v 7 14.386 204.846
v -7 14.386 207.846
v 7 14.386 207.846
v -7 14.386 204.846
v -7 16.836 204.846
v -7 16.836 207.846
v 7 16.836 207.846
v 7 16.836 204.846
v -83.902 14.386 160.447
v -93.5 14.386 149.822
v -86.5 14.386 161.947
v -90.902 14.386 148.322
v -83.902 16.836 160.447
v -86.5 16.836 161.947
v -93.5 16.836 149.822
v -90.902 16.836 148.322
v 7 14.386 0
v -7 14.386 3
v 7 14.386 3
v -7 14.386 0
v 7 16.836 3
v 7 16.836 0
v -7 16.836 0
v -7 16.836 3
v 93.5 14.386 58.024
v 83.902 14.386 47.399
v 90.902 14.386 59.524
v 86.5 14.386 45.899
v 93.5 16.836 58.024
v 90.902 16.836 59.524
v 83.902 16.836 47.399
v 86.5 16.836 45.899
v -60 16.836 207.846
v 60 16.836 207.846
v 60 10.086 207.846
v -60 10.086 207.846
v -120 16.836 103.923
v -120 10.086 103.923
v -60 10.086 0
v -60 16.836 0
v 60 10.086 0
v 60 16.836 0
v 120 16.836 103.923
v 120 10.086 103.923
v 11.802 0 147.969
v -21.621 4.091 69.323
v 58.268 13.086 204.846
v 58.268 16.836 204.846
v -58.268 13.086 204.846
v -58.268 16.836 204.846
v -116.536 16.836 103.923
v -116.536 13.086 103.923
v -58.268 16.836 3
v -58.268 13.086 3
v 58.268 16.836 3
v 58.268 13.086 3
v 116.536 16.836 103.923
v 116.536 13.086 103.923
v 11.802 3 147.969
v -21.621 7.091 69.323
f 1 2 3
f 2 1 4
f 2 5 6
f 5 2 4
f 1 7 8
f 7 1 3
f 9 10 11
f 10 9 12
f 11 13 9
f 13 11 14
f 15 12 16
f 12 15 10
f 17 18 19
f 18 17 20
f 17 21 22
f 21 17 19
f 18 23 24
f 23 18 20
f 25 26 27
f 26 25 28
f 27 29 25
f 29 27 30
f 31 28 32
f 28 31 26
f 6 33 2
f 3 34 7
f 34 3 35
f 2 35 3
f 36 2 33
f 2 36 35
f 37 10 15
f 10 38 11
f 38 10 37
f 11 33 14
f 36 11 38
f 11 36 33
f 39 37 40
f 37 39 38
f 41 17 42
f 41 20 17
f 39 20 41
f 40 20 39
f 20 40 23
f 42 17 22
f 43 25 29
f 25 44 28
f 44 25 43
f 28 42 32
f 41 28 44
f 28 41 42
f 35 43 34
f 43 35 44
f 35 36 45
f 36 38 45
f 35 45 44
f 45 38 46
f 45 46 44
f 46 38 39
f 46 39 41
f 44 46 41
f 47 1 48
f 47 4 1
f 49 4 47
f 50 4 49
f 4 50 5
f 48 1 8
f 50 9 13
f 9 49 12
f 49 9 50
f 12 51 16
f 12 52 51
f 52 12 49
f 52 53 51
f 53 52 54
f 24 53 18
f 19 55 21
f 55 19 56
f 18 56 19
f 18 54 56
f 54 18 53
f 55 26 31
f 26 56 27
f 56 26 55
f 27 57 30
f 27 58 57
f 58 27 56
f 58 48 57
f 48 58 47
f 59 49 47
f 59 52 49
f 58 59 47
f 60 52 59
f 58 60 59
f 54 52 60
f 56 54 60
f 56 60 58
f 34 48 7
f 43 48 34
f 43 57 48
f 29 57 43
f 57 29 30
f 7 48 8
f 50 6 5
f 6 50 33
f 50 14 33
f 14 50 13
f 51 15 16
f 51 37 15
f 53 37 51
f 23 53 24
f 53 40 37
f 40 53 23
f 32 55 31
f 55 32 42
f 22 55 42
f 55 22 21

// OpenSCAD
/*
    parametric_faceted_hex_wall_tile_mount_v39_removable_adhesive_clips.scad
    ------------------------------------------------------------
    Improved asymmetric low-poly hex wall tile.

    v39 removable adhesive-clip edition
    ------------------------------------
    Goals:
    - Preserve the clean open-back wall tile.
    - Preserve fast flat-side-down vertical printing.
    - Remove all integrated adhesive tabs/pads.
    - Add four shallow receiver pockets in the rear perimeter wall.
    - Use four identical separately printed adhesive clips.
    - Clips print flat and have a large planar surface for Command strips,
      VHB, or other double-sided wall tape.
    - Tile remains free of floating mounting islands.

    Major v22 changes
    -----------------
    1. ONE master thickness control drives the whole part:
       master_thickness_mm

    2. FIXED mounting tabs showing through the front face.
       - edge height now automatically provides enough cavity depth
         for the full mounting-pad thickness
       - mounting tabs and ribs are also clipped against a safe volume
         below the underside of the faceted front shell
       - tabs therefore remain hidden inside the tile


       It controls:
       - faceted front shell thickness
       - perimeter wall thickness
       - mounting-tab thickness

       Optional multipliers allow advanced tuning without hiding the
       master control.

    2. Thicker shells now work automatically.
       The effective edge height is automatically raised when required
       so shell_thickness_mm is never blocked by a too-small edge height.

    3. Mounting pads cannot protrude outside the hexagon.
       Pads are intersected with a smaller inset hex footprint.

    4. Stronger default mounting geometry.
       - 3.0 mm pad thickness
       - 4.0 mm shell overlap
       - 3.0 mm edge inset
       - optional reinforcing ribs

    5. Open back remains truly open.
       There is no rear floor across the middle.

    Recommended use
    ---------------
    For a 9-inch decorative wall tile printed vertically:

        master_thickness_mm        = 3.0;
        front_shell_multiplier      = 1.0;
        perimeter_multiplier        = 1.0;
        mount_pad_multiplier        = 1.0;
        mount_pad_overlap_mm        = 4.0;
        mount_pad_edge_inset_mm     = 3.0;
        add_mount_ribs              = true;

    Export
    ------
    F6 Render
    File -> Export -> Export as STL
*/


// =============================================================================
// CUSTOMIZER PARAMETERS
// =============================================================================


/* [Tile Size] */

// Which dimension tile_size represents.
size_reference = "across_corners";   // [flat_to_flat, across_corners]

// Units for tile_size.
size_units = "mm";                   // [mm, in]

// Examples:
// 152.4 = 6"
// 203.2 = 8"
// 228.6 = 9"
// 254.0 = 10"
tile_size = 240.0;

// Rotate finished tile around Z.
tile_rotation_deg = 15;


/* [Export / Print Orientation] */

// "flat"     = original CAD orientation.
// "vertical" = stand the tile on one complete flat hex side.
export_orientation = "vertical";          // [flat, vertical]

// Finished face uses 15 degrees. Adding another 15 degrees before standing
// gives an effective 30-degree regular-hex orientation, so a COMPLETE FLAT
// SIDE rests on the build plate.
vertical_edge_angle_deg = 15;


/* [v39 Part Output] */

// tile     = vertical-print-ready tile with four receiver pockets
// clip     = one removable adhesive clip, oriented flat for printing
// assembly = flat CAD preview of tile + four clips installed
part_to_render = "tile";                  // [tile, clip, assembly]


/* [Removable Adhesive Clip System] */

// Receiver locations match the original four-pad concept.
clip_angles = [60, 120, 240, 300];

// Receiver pocket width along the local perimeter.
receiver_width_mm = 14.0;

// Receiver pocket depth across the perimeter ring.
// Slightly larger than the 3 mm wall so the pocket fully opens to the cavity.
receiver_radial_depth_mm = 4.2;

// Receiver recess depth from the rear face into the tile.
receiver_recess_mm = 2.4;

// Clearance around the clip tongue.
clip_clearance_mm = 0.25;

// Adhesive pad body size.
clip_body_width_mm = 32.0;
clip_body_depth_mm = 24.0;
clip_body_thickness_mm = 2.4;

// Tongue that plugs into the rear receiver pocket.
clip_tongue_width_mm =
    receiver_width_mm - 2 * clip_clearance_mm;

clip_tongue_radial_depth_mm =
    3.2;

clip_tongue_height_mm =
    receiver_recess_mm - clip_clearance_mm;

// How far the large adhesive pad extends inward from the perimeter ring.
clip_body_inward_offset_mm = 1.0;

// Small lead-in taper on the tongue for easier insertion.
clip_tongue_leadin_mm = 0.6;

// Optional center relief in the adhesive body.
// Keep false for maximum tape area.
clip_body_center_relief = false;
clip_body_relief_diameter_mm = 10.0;




/* [MASTER THICKNESS] */

// MASTER MATERIAL THICKNESS.
//
// THIS is the main control to use if you want the whole printed part
// physically thicker / stronger.
//
// It directly drives:
//   - faceted front shell thickness
//   - perimeter wall thickness
//   - mounting pad thickness
//
// Recommended:
//   1.6 = light
//   2.0 = medium
//   2.5 = strong
//   3.0 = very strong / recommended for a robust wall tile
//   3.5 = heavy duty
//
master_thickness_mm = 3.0;

// Optional multipliers.
//
// Leave these at 1.0 unless you deliberately want one area stronger
// than the master value.
//
// Example:
// perimeter_multiplier = 1.20 makes a 3.0 mm master produce a
// 3.6 mm perimeter.
front_shell_multiplier = 1.0;
perimeter_multiplier   = 1.0;
mount_pad_multiplier   = 1.0;

// Derived thicknesses are calculated later from the master control.


/* [Front Relief] */

// proportional = scales with tile size
// absolute     = exact millimeter heights below
relief_height_mode = "proportional";    // [proportional, absolute]

// Overall relief multiplier.
relief_scale = 1.0;

// Main peak height relative to flat-to-flat size.
peak_height_ratio = 0.081;

// Ridge height relative to peak.
ridge_to_peak_ratio = 0.757;

// Requested outer edge height relative to peak.
//
// IMPORTANT:
// v21 automatically raises edge height if necessary to fit the selected
// front shell thickness. You normally do NOT need to change this anymore.
edge_to_peak_ratio = 0.097;

// Absolute values, used only in absolute mode.
peak_height_mm  = 18.5;
ridge_height_mm = 14.0;
edge_height_mm  = 1.8;

// Minimum empty clearance between the inner roof and Z=0 at the perimeter.
//
// v20 uses:
// effective_edge_height >= front_shell_thickness_mm + edge_clearance_mm
edge_clearance_mm = 0.60;


/* [Facet Layout] */

// Direction of main peak, CCW from +X.
peak_angle_deg = 45;

// Peak distance from center as a fraction of circumradius.
peak_radius_ratio = 0.38;

// Direction of secondary ridge.
ridge_angle_deg = 208;

// Ridge radial position.
ridge_radius_ratio = 0.34;


/* [Wall Mounting] */

// Enable mounting pads.
add_mount_pads = false;

// Width of each pad parallel to the corresponding hex side.
mount_pad_width_mm = 34.0;

// Radial depth of each pad.
mount_pad_depth_mm = 24.0;

// Mounting-tab thickness is now driven by master_thickness_mm.
// Use mount_pad_multiplier above only if the tabs need to be thicker
// or thinner than the rest of the tile.

// How far the pad reaches beneath the inner perimeter shell.
//
// More overlap creates a stronger pad-to-rim union.
mount_pad_overlap_mm = 4.0;

// Pull the ENTIRE usable pad footprint inward from the outside hex edge.
//
// Pads are clipped against this inset hex, so they cannot protrude outside.
mount_pad_edge_inset_mm = 2.0;

// Minimum air gap between the TOP of mounting geometry and the
// UNDERSIDE of the faceted front shell.
//
// This prevents tabs/ribs from becoming visible through the face.
// Recommended: 0.50-1.00 mm.
mount_face_clearance_mm = 0.75;

// Directions of mounting pads.
mount_pad_angles = [60, 120, 240, 300];


/* [Mount Reinforcement] */

// Add small triangular reinforcing ribs where pads meet the perimeter.
//
// Recommended ON for vertical printing.
add_mount_ribs = false;

// Rib thickness across the pad.
mount_rib_width_mm = 3.0;

// Rib height into the cavity.
mount_rib_height_mm = 5.0;

// Rib radial depth.
mount_rib_depth_mm = 8.0;


/* [Optional Screw Holes] */

add_pad_screw_holes = false;

// 3.5 ~= #6
// 4.5 ~= #8
pad_screw_hole_diameter_mm = 4.5;


/* [Advanced] */

// Polyhedron preview hint.
polyhedron_convexity = 12;

// Cylinder quality for screw holes.
screw_hole_fn = 40;


// =============================================================================
// DERIVED MATERIAL THICKNESSES
// =============================================================================
//
// These are the ACTUAL thicknesses used by the model.
//

front_shell_thickness_mm =
    master_thickness_mm * front_shell_multiplier;

perimeter_wall_thickness_mm =
    master_thickness_mm * perimeter_multiplier;

mount_pad_thickness_mm =
    master_thickness_mm * mount_pad_multiplier;


// =============================================================================
// DERIVED TILE DIMENSIONS
// =============================================================================

_tile_size_mm =
    size_units == "in"
        ? tile_size * 25.4
        : tile_size;

tile_flat_to_flat =
    size_reference == "flat_to_flat"
        ? _tile_size_mm
        : _tile_size_mm * cos(30);

tile_across_corners =
    tile_flat_to_flat / cos(30);

outer_apothem =
    tile_flat_to_flat / 2;

r_outer =
    outer_apothem / cos(30);

inner_apothem =
    outer_apothem - perimeter_wall_thickness_mm;

r_inner =
    inner_apothem / cos(30);

inner_flat_length =
    2 * inner_apothem * tan(30);

hex_side_length =
    2 * r_outer * sin(30);


// =============================================================================
// DERIVED VERTICAL-PRINT GEOMETRY
// =============================================================================

vertical_total_rotation_deg =
    tile_rotation_deg + vertical_edge_angle_deg;

vertical_half_y =
    max([
        for (i = [0 : 5])
            abs(
                r_outer
                * sin(
                    30
                    + i * 60
                    + vertical_total_rotation_deg
                )
            )
    ]);

vertical_print_height =
    2 * vertical_half_y;


// =============================================================================
// DERIVED RELIEF HEIGHTS
// =============================================================================

_peak_unscaled =
    relief_height_mode == "proportional"
        ? tile_flat_to_flat * peak_height_ratio
        : peak_height_mm;

_ridge_unscaled =
    relief_height_mode == "proportional"
        ? _peak_unscaled * ridge_to_peak_ratio
        : ridge_height_mm;

_requested_edge_unscaled =
    relief_height_mode == "proportional"
        ? _peak_unscaled * edge_to_peak_ratio
        : edge_height_mm;

peak_height =
    _peak_unscaled * relief_scale;

ridge_height =
    _ridge_unscaled * relief_scale;

requested_edge_height =
    _requested_edge_unscaled * relief_scale;

// AUTO-FIX:
// Guarantee enough vertical room for BOTH:
//   1. the chosen front-shell thickness
//   2. the full mounting-pad thickness
//
// This is the key v22 fix for tabs previously breaking through the face.
minimum_edge_height =
    front_shell_thickness_mm
    + mount_pad_thickness_mm
    + mount_face_clearance_mm;

edge_height =
    max(
        requested_edge_height,
        minimum_edge_height
    );


// =============================================================================
// DERIVED MOUNTING GEOMETRY
// =============================================================================

// Desired outer edge before clipping.
//
// This allows the pad to overlap the inner wall structurally.
mount_pad_desired_outer_r =
    inner_apothem + mount_pad_overlap_mm;

mount_pad_inner_r =
    mount_pad_desired_outer_r - mount_pad_depth_mm;

mount_pad_center_r =
    mount_pad_desired_outer_r - mount_pad_depth_mm / 2;

// Smaller hex used as a hard clipping boundary.
//
// Any mount geometry outside this boundary is removed automatically.
mount_clip_apothem =
    outer_apothem - mount_pad_edge_inset_mm;

mount_clip_radius =
    mount_clip_apothem / cos(30);


// =============================================================================
// VALIDATION
// =============================================================================

assert(
    tile_flat_to_flat > 0,
    "tile_size must produce a positive tile dimension."
);

assert(
    master_thickness_mm > 0,
    "master_thickness_mm must be greater than zero."
);

assert(
    front_shell_multiplier > 0 &&
    perimeter_multiplier > 0 &&
    mount_pad_multiplier > 0,
    "All thickness multipliers must be greater than zero."
);

assert(
    front_shell_thickness_mm > 0,
    "front_shell_thickness_mm must be greater than zero."
);

assert(
    perimeter_wall_thickness_mm > 0,
    "perimeter_wall_thickness_mm must be greater than zero."
);

assert(
    perimeter_wall_thickness_mm < outer_apothem,
    "perimeter_wall_thickness_mm is too large for this tile."
);

assert(
    inner_apothem > 0,
    "The selected perimeter wall leaves no hollow interior."
);

assert(
    edge_height > front_shell_thickness_mm,
    "Internal error: edge_height must exceed front_shell_thickness_mm."
);

assert(
    ridge_height > edge_height,
    "ridge_height must remain greater than the effective edge height."
);

assert(
    peak_height > ridge_height,
    "peak_height must remain greater than ridge_height."
);

assert(
    peak_radius_ratio > 0 && peak_radius_ratio < 0.90,
    "peak_radius_ratio must be between 0 and 0.90."
);

assert(
    ridge_radius_ratio > 0 && ridge_radius_ratio < 0.90,
    "ridge_radius_ratio must be between 0 and 0.90."
);

assert(
    mount_pad_width_mm > 0,
    "mount_pad_width_mm must be greater than zero."
);

assert(
    mount_pad_depth_mm > 0,
    "mount_pad_depth_mm must be greater than zero."
);

assert(
    mount_pad_thickness_mm > 0,
    "mount_pad_thickness_mm must be greater than zero."
);

assert(
    mount_pad_overlap_mm >= 0,
    "mount_pad_overlap_mm cannot be negative."
);

assert(
    mount_pad_edge_inset_mm >= 0,
    "mount_pad_edge_inset_mm cannot be negative."
);

assert(
    mount_face_clearance_mm >= 0,
    "mount_face_clearance_mm cannot be negative."
);

assert(
    mount_clip_apothem > 0,
    "mount_pad_edge_inset_mm is too large."
);

assert(
    mount_pad_inner_r > 0,
    "mount_pad_depth_mm is too large and reaches/passes the tile center."
);

assert(
    !add_pad_screw_holes ||
    pad_screw_hole_diameter_mm < mount_pad_width_mm * 0.75,
    "pad_screw_hole_diameter_mm is too large for the mounting pad."
);

assert(
    !add_mount_ribs ||
    mount_rib_height_mm > 0,
    "mount_rib_height_mm must be greater than zero."
);


assert(
    receiver_width_mm > 0,
    "receiver_width_mm must be greater than zero."
);

assert(
    receiver_radial_depth_mm > 0,
    "receiver_radial_depth_mm must be greater than zero."
);

assert(
    receiver_recess_mm > 0
    && receiver_recess_mm < edge_height,
    "receiver_recess_mm must be positive and smaller than edge_height."
);

assert(
    clip_clearance_mm >= 0,
    "clip_clearance_mm cannot be negative."
);

assert(
    clip_body_width_mm > clip_tongue_width_mm,
    "clip_body_width_mm must be wider than the clip tongue."
);

assert(
    clip_body_depth_mm > clip_tongue_radial_depth_mm,
    "clip_body_depth_mm must exceed the tongue radial depth."
);

assert(
    clip_tongue_height_mm > 0,
    "clip_tongue_height_mm must be greater than zero."
);


// =============================================================================
// DIAGNOSTIC OUTPUT
// =============================================================================

echo("====================================================");
echo("FACETED HEX WALL TILE v22");
echo("====================================================");

echo(str("flat-to-flat             : ", tile_flat_to_flat, " mm"));
echo(str("across-corners           : ", tile_across_corners, " mm"));
echo(str("hex side length          : ", hex_side_length, " mm"));

echo(str("MASTER thickness         : ", master_thickness_mm, " mm"));
echo(str("actual front shell       : ", front_shell_thickness_mm, " mm"));
echo(str("actual perimeter wall    : ", perimeter_wall_thickness_mm, " mm"));
echo(str("actual mount pad         : ", mount_pad_thickness_mm, " mm"));
echo(str("perimeter wall thickness : ", perimeter_wall_thickness_mm, " mm"));

echo(str("requested edge height    : ", requested_edge_height, " mm"));
echo(str("minimum edge height      : ", minimum_edge_height, " mm"));
echo(str("EFFECTIVE edge height    : ", edge_height, " mm"));

echo(str("ridge height             : ", ridge_height, " mm"));
echo(str("peak height              : ", peak_height, " mm"));
echo(str("export orientation       : ", export_orientation));
echo(str("vertical print height    : ", vertical_print_height, " mm"));
echo(str("vertical relief depth    : ", peak_height, " mm"));
echo(str("effective print rotation : ", vertical_total_rotation_deg, " deg"));
echo(str("v39 part                  : ", part_to_render));
echo(str("receiver width            : ", receiver_width_mm, " mm"));
echo(str("receiver recess           : ", receiver_recess_mm, " mm"));
echo(str("clip body                 : ", clip_body_width_mm, " x ",
         clip_body_depth_mm, " x ", clip_body_thickness_mm, " mm"));
echo(str("clip tongue               : ", clip_tongue_width_mm, " x ",
         clip_tongue_radial_depth_mm, " x ", clip_tongue_height_mm, " mm"));

echo(str("mount pad width          : ", mount_pad_width_mm, " mm"));
echo(str("mount pad depth          : ", mount_pad_depth_mm, " mm"));
echo(str("mount pad thickness      : ", mount_pad_thickness_mm, " mm"));
echo(str("mount pad overlap        : ", mount_pad_overlap_mm, " mm"));
echo(str("mount edge inset         : ", mount_pad_edge_inset_mm, " mm"));
echo(str("mount/face clearance     : ", mount_face_clearance_mm, " mm"));

echo(str("mount clip apothem       : ", mount_clip_apothem, " mm"));

if (edge_height > requested_edge_height)
    echo(
        str(
            "AUTO EDGE FIX ACTIVE: edge raised from ",
            requested_edge_height,
            " mm to ",
            edge_height,
            " mm so a ",
            front_shell_thickness_mm,
            " mm front shell and ", mount_pad_thickness_mm, " mm mounting tabs fit safely."
        )
    );

echo("====================================================");


// =============================================================================
// HELPERS
// =============================================================================

function polar(angle_deg, radius) =
    [
        radius * cos(angle_deg),
        radius * sin(angle_deg)
    ];

function hex_vertex(i, radius) =
    [
        radius * cos(30 + i * 60),
        radius * sin(30 + i * 60)
    ];


// =============================================================================
// FRONT RELIEF CONTROL POINTS
// =============================================================================

P_xy =
    polar(
        peak_angle_deg,
        r_outer * peak_radius_ratio
    );

Q_xy =
    polar(
        ridge_angle_deg,
        r_outer * ridge_radius_ratio
    );


// =============================================================================
// SHELL VERTICES
// =============================================================================

points =
    concat(

        // 0..5 : outer rear perimeter
        [
            for (i = [0 : 5])
                let(p = hex_vertex(i, r_outer))
                [p[0], p[1], 0]
        ],

        // 6..11 : outer front perimeter
        [
            for (i = [0 : 5])
                let(p = hex_vertex(i, r_outer))
                [p[0], p[1], edge_height]
        ],

        // 12..13 : outer peak / ridge
        [
            [P_xy[0], P_xy[1], peak_height],
            [Q_xy[0], Q_xy[1], ridge_height]
        ],

        // 14..19 : inner rear perimeter
        [
            for (i = [0 : 5])
                let(p = hex_vertex(i, r_inner))
                [p[0], p[1], 0]
        ],

        // 20..25 : inner front perimeter
        [
            for (i = [0 : 5])
                let(p = hex_vertex(i, r_inner))
                [p[0], p[1], edge_height - front_shell_thickness_mm]
        ],

        // 26..27 : inner peak / ridge
        [
            [P_xy[0], P_xy[1], peak_height - front_shell_thickness_mm],
            [Q_xy[0], Q_xy[1], ridge_height - front_shell_thickness_mm]
        ]
    );


// =============================================================================
// SHELL FACES
// =============================================================================

outer_roof_faces = [
    [6, 7, 12],
    [7, 8, 12],
    [6, 12, 11],

    [8, 13, 12],
    [11, 12, 13],

    [8, 9, 13],
    [9, 10, 13],
    [10, 11, 13]
];

inner_roof_faces = [
    [26, 21, 20],
    [26, 22, 21],
    [25, 26, 20],

    [26, 27, 22],
    [27, 26, 25],

    [27, 23, 22],
    [27, 24, 23],
    [27, 25, 24]
];

faces =
    concat(

        // Outer vertical perimeter
        [
            for (i = [0 : 5])
                [
                    i,
                    (i + 1) % 6,
                    6 + (i + 1) % 6,
                    6 + i
                ]
        ],

        outer_roof_faces,

        // Inner vertical perimeter
        [
            for (i = [0 : 5])
                [
                    14 + i,
                    20 + i,
                    20 + (i + 1) % 6,
                    14 + (i + 1) % 6
                ]
        ],

        inner_roof_faces,

        // Narrow rear perimeter ring only.
        // Center remains open.
        [
            for (i = [0 : 5])
                [
                    i,
                    14 + i,
                    14 + (i + 1) % 6,
                    (i + 1) % 6
                ]
        ]
    );


// =============================================================================
// TILE SHELL
// =============================================================================

module tile_shell() {
    polyhedron(
        points = points,
        faces = faces,
        convexity = polyhedron_convexity
    );
}


// =============================================================================
// SAFE MOUNTING VOLUME BELOW THE FRONT FACE
// =============================================================================
//
// This volume follows the UNDERSIDE of the faceted front shell, offset
// downward by mount_face_clearance_mm.
//
// Mount pads and ribs are intersected with this volume. Even if a future
// parameter combination becomes aggressive, mounting geometry cannot pass
// through the visible front shell.
//

safe_edge_z =
    max(
        0.01,
        edge_height
        - front_shell_thickness_mm
        - mount_face_clearance_mm
    );

safe_peak_z =
    max(
        0.01,
        peak_height
        - front_shell_thickness_mm
        - mount_face_clearance_mm
    );

safe_ridge_z =
    max(
        0.01,
        ridge_height
        - front_shell_thickness_mm
        - mount_face_clearance_mm
    );

safe_mount_points =
    concat(

        // 0..5: rear outer perimeter
        [
            for (i = [0 : 5])
                let(p = hex_vertex(i, r_outer))
                [p[0], p[1], 0]
        ],

        // 6..11: safe ceiling at outer perimeter
        [
            for (i = [0 : 5])
                let(p = hex_vertex(i, r_outer))
                [p[0], p[1], safe_edge_z]
        ],

        // 12..13: safe ceiling under peak/ridge
        [
            [P_xy[0], P_xy[1], safe_peak_z],
            [Q_xy[0], Q_xy[1], safe_ridge_z]
        ]
    );

safe_mount_ceiling_faces = [
    [6, 7, 12],
    [7, 8, 12],
    [6, 12, 11],
    [8, 13, 12],
    [11, 12, 13],
    [8, 9, 13],
    [9, 10, 13],
    [10, 11, 13]
];

safe_mount_faces =
    concat(

        // Outer side walls.
        [
            for (i = [0 : 5])
                [
                    i,
                    (i + 1) % 6,
                    6 + (i + 1) % 6,
                    6 + i
                ]
        ],

        // Sloped safe ceiling.
        safe_mount_ceiling_faces,

        // Rear floor used only as a clipping volume closure.
        [[5, 4, 3, 2, 1, 0]]
    );

module safe_mount_volume() {
    polyhedron(
        points = safe_mount_points,
        faces = safe_mount_faces,
        convexity = polyhedron_convexity
    );
}


// =============================================================================
// HEX FOOTPRINT USED TO CLIP MOUNTING TABS
// =============================================================================
//
// This is intentionally smaller than the visible outer hexagon.
// Therefore mount pads/ribs cannot stick out past the visible perimeter.
//

module mount_clip_volume(height_mm) {
    linear_extrude(height = height_mm)
        polygon(
            points = [
                for (i = [0 : 5])
                    hex_vertex(i, mount_clip_radius)
            ]
        );
}


// =============================================================================
// RAW MOUNT PAD
// =============================================================================

module raw_mount_pad(angle_deg) {
    rotate([0, 0, angle_deg])
        translate(
            [
                mount_pad_inner_r,
                -mount_pad_width_mm / 2,
                0
            ]
        )
            cube(
                [
                    mount_pad_depth_mm,
                    mount_pad_width_mm,
                    mount_pad_thickness_mm
                ]
            );
}


// =============================================================================
// CLIPPED MOUNT PAD
// =============================================================================

module mount_pad(angle_deg) {
    intersection() {

        raw_mount_pad(angle_deg);

        // Keep pad inside the inset hex footprint.
        mount_clip_volume(
            mount_pad_thickness_mm + 0.01
        );

        // Hard stop below the underside of the front face.
        safe_mount_volume();
    }
}


// =============================================================================
// OPTIONAL REINFORCING RIBS
// =============================================================================
//
// Two ribs are placed near the left/right sides of each mounting pad.
//
// They rise into the cavity and help resist bending at the pad-to-shell joint.
//

module raw_mount_ribs(angle_deg) {

    rib_center_r =
        mount_pad_desired_outer_r
        - mount_rib_depth_mm / 2;

    rib_side_offset =
        max(
            0,
            mount_pad_width_mm / 2
            - mount_rib_width_mm
            - 2
        );

    rotate([0, 0, angle_deg]) {

        for (side = [-1, 1]) {

            translate(
                [
                    rib_center_r - mount_rib_depth_mm / 2,
                    side * rib_side_offset - mount_rib_width_mm / 2,
                    mount_pad_thickness_mm
                ]
            )

            rotate([90, 0, 90])

            linear_extrude(height = mount_rib_depth_mm)

            polygon(
                points = [
                    [0, 0],
                    [mount_rib_width_mm, 0],
                    [mount_rib_width_mm, mount_rib_height_mm],
                    [0, 0]
                ]
            );
        }
    }
}


module mount_ribs(angle_deg) {
    intersection() {

        raw_mount_ribs(angle_deg);

        mount_clip_volume(
            mount_pad_thickness_mm
            + mount_rib_height_mm
            + 0.1
        );

        // Ribs are also prohibited from crossing the front-shell underside.
        safe_mount_volume();
    }
}


// =============================================================================
// OPTIONAL SCREW HOLE
// =============================================================================

module pad_screw_hole(angle_deg) {

    rotate([0, 0, angle_deg])

        translate(
            [
                mount_pad_center_r,
                0,
                -1
            ]
        )

            cylinder(
                d = pad_screw_hole_diameter_mm,
                h =
                    mount_pad_thickness_mm
                    + mount_rib_height_mm
                    + 2,
                $fn = screw_hole_fn
            );
}


// =============================================================================
// v39 REMOVABLE ADHESIVE CLIP SYSTEM
// =============================================================================
//
// Receiver pockets are shallow recesses cut into the REAR face of the perimeter
// ring. They replace all integrated adhesive tabs.
//
// Each separate clip:
// - prints flat
// - has a large planar adhesive body
// - has a small push-fit tongue that enters one receiver
// - can be replaced without reprinting the decorative tile


module raw_receiver_pocket(angle_deg) {

    // Pocket centered on the perimeter wall.
    // Radial start is slightly inside the inner wall and extends across
    // the complete ring thickness.
    pocket_radial_start =
        inner_apothem - 0.6;

    rotate([0, 0, angle_deg])

        translate(
            [
                pocket_radial_start,
                -receiver_width_mm / 2,
                -0.05
            ]
        )

            cube(
                [
                    receiver_radial_depth_mm,
                    receiver_width_mm,
                    receiver_recess_mm + 0.10
                ]
            );
}


module receiver_pockets() {

    for (a = clip_angles)
        raw_receiver_pocket(a);
}


// Clean tile body with NO integrated mounting pads.
module clean_tile_with_receivers_flat() {

    difference() {

        // Keep only the original shell.
        rotate([0, 0, tile_rotation_deg])
            tile_shell();

        // Receiver angles are defined in the tile's local frame.
        rotate([0, 0, tile_rotation_deg])
            receiver_pockets();
    }
}


// Vertical-print-ready tile.
// Stands on one complete flat hex side.
module clean_tile_with_receivers_vertical() {

    translate(
        [
            0,
            peak_height,
            vertical_half_y
        ]
    )

    rotate([90, 0, 0])

    rotate([0, 0, vertical_edge_angle_deg])

        clean_tile_with_receivers_flat();
}


// Generic clip in local coordinates.
//
// Local axes:
//   X = radial direction (toward tile center)
//   Y = tangential direction
//   Z = rear/front depth
//
// For printing, clip is output with its adhesive face on the build plate.
module adhesive_clip_local() {

    body_radial_start =
        -clip_body_depth_mm
        + clip_body_inward_offset_mm;

    tongue_radial_start =
        -clip_tongue_radial_depth_mm;

    difference() {

        union() {

            // Large adhesive pad body.
            translate(
                [
                    body_radial_start,
                    -clip_body_width_mm / 2,
                    -clip_body_thickness_mm
                ]
            )
                cube(
                    [
                        clip_body_depth_mm,
                        clip_body_width_mm,
                        clip_body_thickness_mm
                    ]
                );

            // Main tongue.
            translate(
                [
                    tongue_radial_start,
                    -clip_tongue_width_mm / 2,
                    0
                ]
            )
                cube(
                    [
                        clip_tongue_radial_depth_mm,
                        clip_tongue_width_mm,
                        clip_tongue_height_mm
                    ]
                );

            // Small tapered lead-in at tongue tip.
            translate(
                [
                    tongue_radial_start
                    + clip_tongue_radial_depth_mm
                    - clip_tongue_leadin_mm,
                    -clip_tongue_width_mm / 2,
                    clip_tongue_height_mm
                ]
            )
                linear_extrude(height = clip_tongue_leadin_mm)
                    polygon(
                        points = [
                            [0, 0],
                            [clip_tongue_leadin_mm, 0],
                            [clip_tongue_leadin_mm, clip_tongue_width_mm],
                            [0, clip_tongue_width_mm]
                        ]
                    );
        }

        if (clip_body_center_relief)
            translate(
                [
                    body_radial_start + clip_body_depth_mm / 2,
                    0,
                    -clip_body_thickness_mm - 0.1
                ]
            )
                cylinder(
                    d = clip_body_relief_diameter_mm,
                    h = clip_body_thickness_mm + 0.2,
                    $fn = 48
                );
    }
}


// Print orientation for ONE clip.
// Adhesive pad lies flat on Z=0, tongue points upward.
module adhesive_clip_print() {

    translate(
        [
            clip_body_depth_mm / 2,
            0,
            clip_body_thickness_mm
        ]
    )

        adhesive_clip_local();
}


// Installed clip at a receiver angle for assembly preview.
module installed_clip(angle_deg) {

    // Place clip around the perimeter with body extending inward into the
    // open rear cavity. Tongue projects into the shallow receiver.
    rotate([0, 0, tile_rotation_deg + angle_deg])

        translate(
            [
                inner_apothem + 0.4,
                0,
                0
            ]
        )

            adhesive_clip_local();
}


// Flat CAD assembly preview.
// This is NOT the recommended print orientation.
module assembly_preview() {

    clean_tile_with_receivers_flat();

    for (a = clip_angles)
        installed_clip(a);
}


// =============================================================================
// v39 REMOVABLE ADHESIVE CLIP SYSTEM
// =============================================================================
//
// Receiver pockets are shallow recesses cut into the REAR face of the perimeter
// ring. They replace all integrated adhesive tabs.
//
// Each separate clip:
// - prints flat
// - has a large planar adhesive body
// - has a small push-fit tongue that enters one receiver
// - can be replaced without reprinting the decorative tile


module raw_receiver_pocket(angle_deg) {

    // Pocket centered on the perimeter wall.
    // Radial start is slightly inside the inner wall and extends across
    // the complete ring thickness.
    pocket_radial_start =
        inner_apothem - 0.6;

    rotate([0, 0, angle_deg])

        translate(
            [
                pocket_radial_start,
                -receiver_width_mm / 2,
                -0.05
            ]
        )

            cube(
                [
                    receiver_radial_depth_mm,
                    receiver_width_mm,
                    receiver_recess_mm + 0.10
                ]
            );
}


module receiver_pockets() {

    for (a = clip_angles)
        raw_receiver_pocket(a);
}


// Clean tile body with NO integrated mounting pads.
module clean_tile_with_receivers_flat() {

    difference() {

        // Keep only the original shell.
        rotate([0, 0, tile_rotation_deg])
            tile_shell();

        // Receiver angles are defined in the tile's local frame.
        rotate([0, 0, tile_rotation_deg])
            receiver_pockets();
    }
}


// Vertical-print-ready tile.
// Stands on one complete flat hex side.
module clean_tile_with_receivers_vertical() {

    translate(
        [
            0,
            peak_height,
            vertical_half_y
        ]
    )

    rotate([90, 0, 0])

    rotate([0, 0, vertical_edge_angle_deg])

        clean_tile_with_receivers_flat();
}


// Generic clip in local coordinates.
//
// Local axes:
//   X = radial direction (toward tile center)
//   Y = tangential direction
//   Z = rear/front depth
//
// For printing, clip is output with its adhesive face on the build plate.
module adhesive_clip_local() {

    body_radial_start =
        -clip_body_depth_mm
        + clip_body_inward_offset_mm;

    tongue_radial_start =
        -clip_tongue_radial_depth_mm;

    difference() {

        union() {

            // Large adhesive pad body.
            translate(
                [
                    body_radial_start,
                    -clip_body_width_mm / 2,
                    -clip_body_thickness_mm
                ]
            )
                cube(
                    [
                        clip_body_depth_mm,
                        clip_body_width_mm,
                        clip_body_thickness_mm
                    ]
                );

            // Main tongue.
            translate(
                [
                    tongue_radial_start,
                    -clip_tongue_width_mm / 2,
                    0
                ]
            )
                cube(
                    [
                        clip_tongue_radial_depth_mm,
                        clip_tongue_width_mm,
                        clip_tongue_height_mm
                    ]
                );

            // Small tapered lead-in at tongue tip.
            translate(
                [
                    tongue_radial_start
                    + clip_tongue_radial_depth_mm
                    - clip_tongue_leadin_mm,
                    -clip_tongue_width_mm / 2,
                    clip_tongue_height_mm
                ]
            )
                linear_extrude(height = clip_tongue_leadin_mm)
                    polygon(
                        points = [
                            [0, 0],
                            [clip_tongue_leadin_mm, 0],
                            [clip_tongue_leadin_mm, clip_tongue_width_mm],
                            [0, clip_tongue_width_mm]
                        ]
                    );
        }

        if (clip_body_center_relief)
            translate(
                [
                    body_radial_start + clip_body_depth_mm / 2,
                    0,
                    -clip_body_thickness_mm - 0.1
                ]
            )
                cylinder(
                    d = clip_body_relief_diameter_mm,
                    h = clip_body_thickness_mm + 0.2,
                    $fn = 48
                );
    }
}


// Print orientation for ONE clip.
// Adhesive pad lies flat on Z=0, tongue points upward.
module adhesive_clip_print() {

    translate(
        [
            clip_body_depth_mm / 2,
            0,
            clip_body_thickness_mm
        ]
    )

        adhesive_clip_local();
}


// Installed clip at a receiver angle for assembly preview.
module installed_clip(angle_deg) {

    // Place clip around the perimeter with body extending inward into the
    // open rear cavity. Tongue projects into the shallow receiver.
    rotate([0, 0, tile_rotation_deg + angle_deg])

        translate(
            [
                inner_apothem + 0.4,
                0,
                0
            ]
        )

            adhesive_clip_local();
}


// Flat CAD assembly preview.
// This is NOT the recommended print orientation.
module assembly_preview() {

    clean_tile_with_receivers_flat();

    for (a = clip_angles)
        installed_clip(a);
}


// =============================================================================
// COMPLETE MODEL / OUTPUT
// =============================================================================

module output_v39() {

    if (part_to_render == "tile") {

        clean_tile_with_receivers_vertical();

    } else if (part_to_render == "clip") {

        adhesive_clip_print();

    } else if (part_to_render == "assembly") {

        assembly_preview();

    } else {

        assert(
            false,
            "part_to_render must be tile, clip, or assembly."
        );
    }
}

output_v39();
